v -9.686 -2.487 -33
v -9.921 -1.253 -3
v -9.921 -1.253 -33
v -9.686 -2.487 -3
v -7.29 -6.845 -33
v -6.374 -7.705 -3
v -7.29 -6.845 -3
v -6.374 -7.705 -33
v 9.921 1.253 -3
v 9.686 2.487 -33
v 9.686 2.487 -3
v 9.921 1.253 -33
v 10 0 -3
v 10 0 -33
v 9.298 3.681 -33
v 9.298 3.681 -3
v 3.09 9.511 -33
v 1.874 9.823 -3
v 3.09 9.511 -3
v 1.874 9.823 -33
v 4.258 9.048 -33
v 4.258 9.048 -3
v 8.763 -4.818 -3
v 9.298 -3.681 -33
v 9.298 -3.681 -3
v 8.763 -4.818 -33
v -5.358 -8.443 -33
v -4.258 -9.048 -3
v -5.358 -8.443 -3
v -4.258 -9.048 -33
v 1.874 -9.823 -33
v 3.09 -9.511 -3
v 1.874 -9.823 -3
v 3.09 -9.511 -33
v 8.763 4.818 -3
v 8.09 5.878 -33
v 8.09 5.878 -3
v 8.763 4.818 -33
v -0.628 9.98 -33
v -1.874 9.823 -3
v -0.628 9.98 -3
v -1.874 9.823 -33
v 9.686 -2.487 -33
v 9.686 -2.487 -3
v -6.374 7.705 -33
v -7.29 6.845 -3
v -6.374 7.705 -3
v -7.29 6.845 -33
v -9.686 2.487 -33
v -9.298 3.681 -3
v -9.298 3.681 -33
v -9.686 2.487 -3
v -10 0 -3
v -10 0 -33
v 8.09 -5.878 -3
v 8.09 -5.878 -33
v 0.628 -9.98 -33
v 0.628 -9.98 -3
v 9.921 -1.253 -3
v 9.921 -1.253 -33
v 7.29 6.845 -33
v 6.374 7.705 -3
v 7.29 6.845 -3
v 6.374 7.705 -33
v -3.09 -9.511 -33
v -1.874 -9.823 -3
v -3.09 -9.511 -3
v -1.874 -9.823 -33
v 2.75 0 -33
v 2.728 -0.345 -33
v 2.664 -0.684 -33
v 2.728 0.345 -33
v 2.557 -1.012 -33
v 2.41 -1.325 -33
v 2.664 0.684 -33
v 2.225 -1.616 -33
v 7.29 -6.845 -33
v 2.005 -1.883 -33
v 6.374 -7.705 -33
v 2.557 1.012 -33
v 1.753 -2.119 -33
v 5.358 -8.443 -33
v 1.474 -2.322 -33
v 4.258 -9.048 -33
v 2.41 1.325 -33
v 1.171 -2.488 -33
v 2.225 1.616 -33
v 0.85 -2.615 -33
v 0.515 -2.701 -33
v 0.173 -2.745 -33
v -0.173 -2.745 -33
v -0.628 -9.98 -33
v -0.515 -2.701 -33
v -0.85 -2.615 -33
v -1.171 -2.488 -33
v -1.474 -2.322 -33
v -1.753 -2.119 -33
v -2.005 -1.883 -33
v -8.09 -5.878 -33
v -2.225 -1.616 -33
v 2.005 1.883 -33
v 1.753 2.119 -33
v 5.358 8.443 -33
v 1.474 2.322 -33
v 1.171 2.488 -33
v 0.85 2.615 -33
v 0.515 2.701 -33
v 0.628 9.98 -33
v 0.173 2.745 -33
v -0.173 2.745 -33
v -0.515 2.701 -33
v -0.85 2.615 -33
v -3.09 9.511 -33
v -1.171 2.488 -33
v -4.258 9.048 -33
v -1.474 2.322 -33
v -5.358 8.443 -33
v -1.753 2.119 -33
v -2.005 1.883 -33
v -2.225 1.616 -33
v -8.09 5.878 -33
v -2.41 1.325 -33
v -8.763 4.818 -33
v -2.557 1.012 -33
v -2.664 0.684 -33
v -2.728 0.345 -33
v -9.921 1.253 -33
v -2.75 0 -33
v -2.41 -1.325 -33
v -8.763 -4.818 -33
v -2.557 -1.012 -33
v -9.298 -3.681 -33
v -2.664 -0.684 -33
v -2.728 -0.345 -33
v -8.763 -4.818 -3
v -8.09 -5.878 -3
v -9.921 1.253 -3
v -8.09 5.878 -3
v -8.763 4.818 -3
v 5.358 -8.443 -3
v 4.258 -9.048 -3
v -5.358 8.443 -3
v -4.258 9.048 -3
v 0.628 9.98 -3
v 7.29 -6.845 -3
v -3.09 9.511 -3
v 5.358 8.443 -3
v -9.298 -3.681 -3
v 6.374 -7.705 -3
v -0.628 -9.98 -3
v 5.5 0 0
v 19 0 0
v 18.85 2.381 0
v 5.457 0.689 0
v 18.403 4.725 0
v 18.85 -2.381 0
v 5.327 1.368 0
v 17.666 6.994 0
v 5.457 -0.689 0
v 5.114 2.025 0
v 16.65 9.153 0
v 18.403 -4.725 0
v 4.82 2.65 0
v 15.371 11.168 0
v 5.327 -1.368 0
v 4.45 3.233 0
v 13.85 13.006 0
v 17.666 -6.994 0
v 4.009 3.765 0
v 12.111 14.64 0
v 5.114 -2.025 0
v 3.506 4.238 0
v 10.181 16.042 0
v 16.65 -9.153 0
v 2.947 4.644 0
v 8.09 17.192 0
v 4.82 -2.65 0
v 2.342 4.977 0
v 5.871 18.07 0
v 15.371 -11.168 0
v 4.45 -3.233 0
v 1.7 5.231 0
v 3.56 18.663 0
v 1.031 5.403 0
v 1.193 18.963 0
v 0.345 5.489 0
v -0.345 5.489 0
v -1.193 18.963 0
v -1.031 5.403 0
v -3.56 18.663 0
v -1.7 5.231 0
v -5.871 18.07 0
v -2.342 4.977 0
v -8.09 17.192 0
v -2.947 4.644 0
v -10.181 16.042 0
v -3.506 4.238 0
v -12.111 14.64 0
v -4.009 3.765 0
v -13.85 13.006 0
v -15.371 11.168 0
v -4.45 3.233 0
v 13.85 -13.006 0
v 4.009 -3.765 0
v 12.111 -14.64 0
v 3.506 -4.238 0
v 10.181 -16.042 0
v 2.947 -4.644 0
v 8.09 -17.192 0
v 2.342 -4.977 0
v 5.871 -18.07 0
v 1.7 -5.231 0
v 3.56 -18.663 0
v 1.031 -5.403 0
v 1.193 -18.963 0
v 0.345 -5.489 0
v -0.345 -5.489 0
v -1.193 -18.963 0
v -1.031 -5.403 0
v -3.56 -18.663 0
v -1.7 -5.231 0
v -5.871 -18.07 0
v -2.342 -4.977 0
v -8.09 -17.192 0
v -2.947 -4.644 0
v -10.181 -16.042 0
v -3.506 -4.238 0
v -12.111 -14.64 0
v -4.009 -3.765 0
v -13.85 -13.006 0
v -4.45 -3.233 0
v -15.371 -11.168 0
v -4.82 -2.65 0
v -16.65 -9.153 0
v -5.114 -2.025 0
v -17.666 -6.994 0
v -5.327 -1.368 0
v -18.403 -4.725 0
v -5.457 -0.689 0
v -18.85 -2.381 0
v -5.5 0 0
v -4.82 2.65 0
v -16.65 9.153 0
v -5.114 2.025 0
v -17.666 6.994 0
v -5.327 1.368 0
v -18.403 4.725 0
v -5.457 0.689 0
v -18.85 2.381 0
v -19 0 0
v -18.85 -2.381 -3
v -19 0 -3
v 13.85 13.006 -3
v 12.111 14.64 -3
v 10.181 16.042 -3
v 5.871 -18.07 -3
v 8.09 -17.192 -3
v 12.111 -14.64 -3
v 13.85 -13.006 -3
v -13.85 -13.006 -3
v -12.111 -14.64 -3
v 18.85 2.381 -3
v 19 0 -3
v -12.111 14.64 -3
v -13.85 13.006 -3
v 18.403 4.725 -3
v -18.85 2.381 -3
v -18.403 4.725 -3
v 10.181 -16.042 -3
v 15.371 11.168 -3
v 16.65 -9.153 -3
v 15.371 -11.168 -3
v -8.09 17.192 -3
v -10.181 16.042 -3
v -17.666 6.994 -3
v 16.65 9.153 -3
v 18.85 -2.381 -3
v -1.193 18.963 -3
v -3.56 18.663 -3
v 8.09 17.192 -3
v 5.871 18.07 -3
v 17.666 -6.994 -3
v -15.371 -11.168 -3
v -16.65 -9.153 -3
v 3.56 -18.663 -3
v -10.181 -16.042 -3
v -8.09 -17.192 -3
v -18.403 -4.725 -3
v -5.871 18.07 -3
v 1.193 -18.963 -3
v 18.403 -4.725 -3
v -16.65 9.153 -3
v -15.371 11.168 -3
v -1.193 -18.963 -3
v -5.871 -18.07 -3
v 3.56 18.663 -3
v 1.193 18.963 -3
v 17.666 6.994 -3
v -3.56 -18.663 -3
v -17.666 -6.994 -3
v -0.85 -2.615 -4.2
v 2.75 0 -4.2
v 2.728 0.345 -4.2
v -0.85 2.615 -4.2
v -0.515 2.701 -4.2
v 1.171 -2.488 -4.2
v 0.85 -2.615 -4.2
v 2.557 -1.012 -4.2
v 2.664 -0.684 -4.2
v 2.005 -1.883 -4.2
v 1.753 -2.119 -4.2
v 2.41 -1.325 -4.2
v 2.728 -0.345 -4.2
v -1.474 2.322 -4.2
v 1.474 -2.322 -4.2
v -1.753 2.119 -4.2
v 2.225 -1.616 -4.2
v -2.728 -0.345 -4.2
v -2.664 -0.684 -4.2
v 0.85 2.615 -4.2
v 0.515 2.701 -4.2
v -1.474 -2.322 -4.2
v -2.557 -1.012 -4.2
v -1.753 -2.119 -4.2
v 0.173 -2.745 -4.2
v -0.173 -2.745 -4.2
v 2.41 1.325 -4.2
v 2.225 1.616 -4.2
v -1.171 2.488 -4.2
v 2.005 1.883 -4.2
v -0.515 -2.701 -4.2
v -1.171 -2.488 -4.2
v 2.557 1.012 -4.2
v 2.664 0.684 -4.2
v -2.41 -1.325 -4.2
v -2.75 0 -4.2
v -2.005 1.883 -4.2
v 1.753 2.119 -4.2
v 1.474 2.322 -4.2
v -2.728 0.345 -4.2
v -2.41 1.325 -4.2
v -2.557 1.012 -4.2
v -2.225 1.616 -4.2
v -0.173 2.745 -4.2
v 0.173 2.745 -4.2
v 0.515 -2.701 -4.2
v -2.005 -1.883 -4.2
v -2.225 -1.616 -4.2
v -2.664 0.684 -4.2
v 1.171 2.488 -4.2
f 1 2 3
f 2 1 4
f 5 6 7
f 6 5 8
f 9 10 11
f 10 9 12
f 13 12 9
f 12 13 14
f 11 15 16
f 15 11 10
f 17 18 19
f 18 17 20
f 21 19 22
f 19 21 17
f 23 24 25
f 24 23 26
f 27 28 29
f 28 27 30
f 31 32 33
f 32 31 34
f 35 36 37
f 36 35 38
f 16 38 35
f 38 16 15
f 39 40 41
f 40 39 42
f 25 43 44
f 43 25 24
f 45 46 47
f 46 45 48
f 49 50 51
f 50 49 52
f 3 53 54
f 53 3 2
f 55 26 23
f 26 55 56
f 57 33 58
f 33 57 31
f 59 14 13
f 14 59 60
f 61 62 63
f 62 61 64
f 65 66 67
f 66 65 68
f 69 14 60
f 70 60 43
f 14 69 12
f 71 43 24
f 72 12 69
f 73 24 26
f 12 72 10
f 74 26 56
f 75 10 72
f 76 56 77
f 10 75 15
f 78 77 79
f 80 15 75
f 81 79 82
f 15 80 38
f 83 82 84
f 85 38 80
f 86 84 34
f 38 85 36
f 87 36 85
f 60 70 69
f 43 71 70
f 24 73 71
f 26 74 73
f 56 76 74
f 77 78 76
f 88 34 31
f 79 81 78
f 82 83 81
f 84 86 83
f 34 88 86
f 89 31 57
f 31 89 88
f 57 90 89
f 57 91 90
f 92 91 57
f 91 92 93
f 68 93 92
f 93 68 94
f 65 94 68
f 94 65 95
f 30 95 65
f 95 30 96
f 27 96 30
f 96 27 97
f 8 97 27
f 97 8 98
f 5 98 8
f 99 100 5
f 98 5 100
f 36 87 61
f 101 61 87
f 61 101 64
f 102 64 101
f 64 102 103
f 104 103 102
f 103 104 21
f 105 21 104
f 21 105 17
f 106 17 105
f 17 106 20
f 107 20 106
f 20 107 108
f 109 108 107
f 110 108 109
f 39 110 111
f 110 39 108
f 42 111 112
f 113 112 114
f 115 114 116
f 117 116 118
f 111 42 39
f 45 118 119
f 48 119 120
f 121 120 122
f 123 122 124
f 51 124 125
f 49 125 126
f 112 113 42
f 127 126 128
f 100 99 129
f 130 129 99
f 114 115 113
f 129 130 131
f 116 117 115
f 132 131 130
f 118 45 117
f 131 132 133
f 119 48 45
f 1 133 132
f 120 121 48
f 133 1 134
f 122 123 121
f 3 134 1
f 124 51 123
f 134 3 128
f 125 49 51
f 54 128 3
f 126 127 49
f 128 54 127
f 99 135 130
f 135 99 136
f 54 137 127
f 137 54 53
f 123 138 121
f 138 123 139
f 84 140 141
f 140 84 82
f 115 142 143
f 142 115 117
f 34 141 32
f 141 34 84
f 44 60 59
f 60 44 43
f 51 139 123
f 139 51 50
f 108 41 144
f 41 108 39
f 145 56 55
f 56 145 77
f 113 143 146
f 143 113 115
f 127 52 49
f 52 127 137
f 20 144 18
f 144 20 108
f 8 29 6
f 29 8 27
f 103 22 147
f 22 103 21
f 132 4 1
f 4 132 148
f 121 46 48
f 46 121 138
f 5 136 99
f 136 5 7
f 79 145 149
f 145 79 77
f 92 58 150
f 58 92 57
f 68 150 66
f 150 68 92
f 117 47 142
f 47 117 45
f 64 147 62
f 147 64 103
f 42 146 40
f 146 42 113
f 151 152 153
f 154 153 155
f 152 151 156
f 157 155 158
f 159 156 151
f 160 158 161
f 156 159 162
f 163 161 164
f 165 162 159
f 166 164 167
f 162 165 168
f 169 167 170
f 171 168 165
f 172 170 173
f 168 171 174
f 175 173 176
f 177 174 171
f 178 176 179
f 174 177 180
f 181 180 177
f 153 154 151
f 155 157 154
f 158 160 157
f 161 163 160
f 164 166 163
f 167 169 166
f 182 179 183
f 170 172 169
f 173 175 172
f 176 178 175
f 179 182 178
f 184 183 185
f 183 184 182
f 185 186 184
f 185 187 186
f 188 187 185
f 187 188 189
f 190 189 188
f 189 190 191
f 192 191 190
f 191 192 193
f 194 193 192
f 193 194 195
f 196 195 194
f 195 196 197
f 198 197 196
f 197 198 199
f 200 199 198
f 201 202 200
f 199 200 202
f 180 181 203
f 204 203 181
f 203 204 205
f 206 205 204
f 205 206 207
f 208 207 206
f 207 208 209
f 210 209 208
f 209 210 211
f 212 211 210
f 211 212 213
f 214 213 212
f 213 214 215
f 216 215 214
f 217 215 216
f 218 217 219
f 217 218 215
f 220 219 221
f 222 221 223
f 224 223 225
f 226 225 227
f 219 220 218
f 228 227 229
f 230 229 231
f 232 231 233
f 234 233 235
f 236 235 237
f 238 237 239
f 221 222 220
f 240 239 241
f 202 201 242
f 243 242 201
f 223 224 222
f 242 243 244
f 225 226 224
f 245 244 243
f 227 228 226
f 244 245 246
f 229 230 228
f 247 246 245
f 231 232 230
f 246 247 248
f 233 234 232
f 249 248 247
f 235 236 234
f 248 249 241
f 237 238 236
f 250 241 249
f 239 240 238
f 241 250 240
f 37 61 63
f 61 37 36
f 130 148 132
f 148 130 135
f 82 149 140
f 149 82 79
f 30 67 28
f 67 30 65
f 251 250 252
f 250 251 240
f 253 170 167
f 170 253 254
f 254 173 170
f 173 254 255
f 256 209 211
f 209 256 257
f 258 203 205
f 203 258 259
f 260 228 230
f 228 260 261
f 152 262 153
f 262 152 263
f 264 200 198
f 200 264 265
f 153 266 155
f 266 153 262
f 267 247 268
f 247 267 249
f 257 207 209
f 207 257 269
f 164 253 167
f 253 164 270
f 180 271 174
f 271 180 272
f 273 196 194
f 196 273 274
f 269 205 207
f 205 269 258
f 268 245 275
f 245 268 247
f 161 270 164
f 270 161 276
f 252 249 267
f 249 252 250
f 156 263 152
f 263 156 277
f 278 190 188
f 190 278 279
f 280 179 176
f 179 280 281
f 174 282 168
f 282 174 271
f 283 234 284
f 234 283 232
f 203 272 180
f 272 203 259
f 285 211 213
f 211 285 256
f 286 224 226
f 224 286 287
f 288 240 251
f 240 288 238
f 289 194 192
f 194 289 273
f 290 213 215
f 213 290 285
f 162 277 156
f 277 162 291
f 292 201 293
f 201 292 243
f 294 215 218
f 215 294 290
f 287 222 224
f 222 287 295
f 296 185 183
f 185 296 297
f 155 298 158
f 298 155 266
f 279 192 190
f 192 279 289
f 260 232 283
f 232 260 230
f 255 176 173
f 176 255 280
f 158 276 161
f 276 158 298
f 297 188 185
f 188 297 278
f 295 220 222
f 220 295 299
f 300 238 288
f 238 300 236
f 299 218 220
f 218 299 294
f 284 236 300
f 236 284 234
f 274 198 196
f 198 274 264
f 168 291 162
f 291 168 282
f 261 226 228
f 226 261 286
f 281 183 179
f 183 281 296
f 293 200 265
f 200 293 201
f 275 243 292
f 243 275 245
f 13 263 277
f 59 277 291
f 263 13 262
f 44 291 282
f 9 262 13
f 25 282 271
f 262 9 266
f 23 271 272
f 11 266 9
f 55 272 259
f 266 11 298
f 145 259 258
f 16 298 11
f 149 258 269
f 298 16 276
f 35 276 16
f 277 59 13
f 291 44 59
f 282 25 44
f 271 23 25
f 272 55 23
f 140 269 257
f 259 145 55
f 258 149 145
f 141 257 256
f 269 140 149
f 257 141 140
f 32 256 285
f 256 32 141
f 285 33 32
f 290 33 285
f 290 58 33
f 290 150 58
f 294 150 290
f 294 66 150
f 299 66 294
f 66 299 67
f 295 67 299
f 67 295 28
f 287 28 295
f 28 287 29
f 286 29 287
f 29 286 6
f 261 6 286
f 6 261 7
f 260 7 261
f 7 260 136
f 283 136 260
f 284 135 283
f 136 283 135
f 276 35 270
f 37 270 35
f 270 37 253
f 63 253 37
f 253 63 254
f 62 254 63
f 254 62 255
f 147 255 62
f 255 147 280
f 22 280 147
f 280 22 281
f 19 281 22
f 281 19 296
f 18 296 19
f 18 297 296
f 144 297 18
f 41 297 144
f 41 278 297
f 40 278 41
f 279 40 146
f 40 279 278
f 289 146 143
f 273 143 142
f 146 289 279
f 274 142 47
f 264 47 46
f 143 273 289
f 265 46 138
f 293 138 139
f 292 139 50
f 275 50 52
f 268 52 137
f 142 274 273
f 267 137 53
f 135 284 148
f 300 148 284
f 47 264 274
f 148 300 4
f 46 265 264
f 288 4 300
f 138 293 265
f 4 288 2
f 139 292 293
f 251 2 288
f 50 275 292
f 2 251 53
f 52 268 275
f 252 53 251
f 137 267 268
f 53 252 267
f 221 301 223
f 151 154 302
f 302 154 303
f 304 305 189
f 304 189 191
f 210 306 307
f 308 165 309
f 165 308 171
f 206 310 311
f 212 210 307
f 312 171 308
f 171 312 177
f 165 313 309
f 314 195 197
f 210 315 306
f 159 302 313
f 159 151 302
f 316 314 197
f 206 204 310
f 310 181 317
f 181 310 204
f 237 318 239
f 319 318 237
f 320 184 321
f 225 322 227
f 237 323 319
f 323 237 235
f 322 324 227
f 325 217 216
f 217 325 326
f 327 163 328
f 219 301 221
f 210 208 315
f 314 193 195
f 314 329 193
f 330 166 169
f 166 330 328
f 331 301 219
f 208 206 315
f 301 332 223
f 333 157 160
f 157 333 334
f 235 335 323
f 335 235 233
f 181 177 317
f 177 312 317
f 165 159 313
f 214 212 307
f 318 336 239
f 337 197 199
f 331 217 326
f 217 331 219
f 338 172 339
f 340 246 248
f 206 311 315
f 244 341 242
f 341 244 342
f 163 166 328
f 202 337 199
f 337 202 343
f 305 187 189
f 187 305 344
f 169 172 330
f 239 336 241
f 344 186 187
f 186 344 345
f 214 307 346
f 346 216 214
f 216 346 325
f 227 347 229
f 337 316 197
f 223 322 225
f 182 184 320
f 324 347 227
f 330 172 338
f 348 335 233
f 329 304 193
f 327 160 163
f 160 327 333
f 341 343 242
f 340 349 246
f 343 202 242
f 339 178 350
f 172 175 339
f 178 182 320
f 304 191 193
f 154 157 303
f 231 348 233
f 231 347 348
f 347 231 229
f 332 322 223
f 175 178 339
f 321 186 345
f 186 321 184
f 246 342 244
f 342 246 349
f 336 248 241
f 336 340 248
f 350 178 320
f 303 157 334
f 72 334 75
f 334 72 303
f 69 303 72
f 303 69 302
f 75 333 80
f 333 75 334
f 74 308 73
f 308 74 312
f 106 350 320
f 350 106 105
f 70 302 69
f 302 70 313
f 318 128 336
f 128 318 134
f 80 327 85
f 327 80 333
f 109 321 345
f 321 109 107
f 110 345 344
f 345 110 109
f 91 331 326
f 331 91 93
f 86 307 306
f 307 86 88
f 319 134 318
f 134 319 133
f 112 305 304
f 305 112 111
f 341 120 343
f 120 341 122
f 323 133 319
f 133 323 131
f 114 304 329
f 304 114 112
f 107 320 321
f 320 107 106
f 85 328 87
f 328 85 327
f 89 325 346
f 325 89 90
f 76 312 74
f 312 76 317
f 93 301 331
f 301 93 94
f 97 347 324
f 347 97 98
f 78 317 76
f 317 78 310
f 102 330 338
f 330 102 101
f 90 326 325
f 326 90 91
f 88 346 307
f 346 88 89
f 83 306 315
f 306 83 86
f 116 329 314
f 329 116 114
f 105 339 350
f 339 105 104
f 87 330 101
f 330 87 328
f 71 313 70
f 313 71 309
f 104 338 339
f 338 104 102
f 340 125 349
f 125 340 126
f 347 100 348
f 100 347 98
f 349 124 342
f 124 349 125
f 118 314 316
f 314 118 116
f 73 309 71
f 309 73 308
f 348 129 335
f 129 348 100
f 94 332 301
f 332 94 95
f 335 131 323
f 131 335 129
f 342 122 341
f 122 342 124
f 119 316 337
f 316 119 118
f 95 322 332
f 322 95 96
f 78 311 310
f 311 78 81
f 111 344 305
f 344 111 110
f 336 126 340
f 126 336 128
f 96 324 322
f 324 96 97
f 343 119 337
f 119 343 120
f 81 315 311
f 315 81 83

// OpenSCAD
$fn = 50;


difference() {
	union() {
		translate(v = [0, 0, -33.0000000000]) {
			cylinder(h = 33, r = 10.0000000000);
		}
		translate(v = [0, 0, -3.0000000000]) {
			cylinder(h = 3, r = 19.0000000000);
		}
	}
	union() {
		translate(v = [0, 0, 0]) {
			rotate(a = [0, 0, 0]) {
				difference() {
					union() {
						#translate(v = [0, 0, -33.0000000000]) {
							cylinder(h = 33, r = 2.2500000000);
						}
						#translate(v = [0, 0, -4.2000000000]) {
							cylinder(h = 4.2000000000, r1 = 2.7500000000, r2 = 5.5000000000);
						}
						#translate(v = [0, 0, -33.0000000000]) {
							cylinder(h = 33, r = 2.7500000000);
						}
						#translate(v = [0, 0, -33.0000000000]) {
							cylinder(h = 33, r = 2.2500000000);
						}
					}
					union();
				}
			}
		}
	}
}
